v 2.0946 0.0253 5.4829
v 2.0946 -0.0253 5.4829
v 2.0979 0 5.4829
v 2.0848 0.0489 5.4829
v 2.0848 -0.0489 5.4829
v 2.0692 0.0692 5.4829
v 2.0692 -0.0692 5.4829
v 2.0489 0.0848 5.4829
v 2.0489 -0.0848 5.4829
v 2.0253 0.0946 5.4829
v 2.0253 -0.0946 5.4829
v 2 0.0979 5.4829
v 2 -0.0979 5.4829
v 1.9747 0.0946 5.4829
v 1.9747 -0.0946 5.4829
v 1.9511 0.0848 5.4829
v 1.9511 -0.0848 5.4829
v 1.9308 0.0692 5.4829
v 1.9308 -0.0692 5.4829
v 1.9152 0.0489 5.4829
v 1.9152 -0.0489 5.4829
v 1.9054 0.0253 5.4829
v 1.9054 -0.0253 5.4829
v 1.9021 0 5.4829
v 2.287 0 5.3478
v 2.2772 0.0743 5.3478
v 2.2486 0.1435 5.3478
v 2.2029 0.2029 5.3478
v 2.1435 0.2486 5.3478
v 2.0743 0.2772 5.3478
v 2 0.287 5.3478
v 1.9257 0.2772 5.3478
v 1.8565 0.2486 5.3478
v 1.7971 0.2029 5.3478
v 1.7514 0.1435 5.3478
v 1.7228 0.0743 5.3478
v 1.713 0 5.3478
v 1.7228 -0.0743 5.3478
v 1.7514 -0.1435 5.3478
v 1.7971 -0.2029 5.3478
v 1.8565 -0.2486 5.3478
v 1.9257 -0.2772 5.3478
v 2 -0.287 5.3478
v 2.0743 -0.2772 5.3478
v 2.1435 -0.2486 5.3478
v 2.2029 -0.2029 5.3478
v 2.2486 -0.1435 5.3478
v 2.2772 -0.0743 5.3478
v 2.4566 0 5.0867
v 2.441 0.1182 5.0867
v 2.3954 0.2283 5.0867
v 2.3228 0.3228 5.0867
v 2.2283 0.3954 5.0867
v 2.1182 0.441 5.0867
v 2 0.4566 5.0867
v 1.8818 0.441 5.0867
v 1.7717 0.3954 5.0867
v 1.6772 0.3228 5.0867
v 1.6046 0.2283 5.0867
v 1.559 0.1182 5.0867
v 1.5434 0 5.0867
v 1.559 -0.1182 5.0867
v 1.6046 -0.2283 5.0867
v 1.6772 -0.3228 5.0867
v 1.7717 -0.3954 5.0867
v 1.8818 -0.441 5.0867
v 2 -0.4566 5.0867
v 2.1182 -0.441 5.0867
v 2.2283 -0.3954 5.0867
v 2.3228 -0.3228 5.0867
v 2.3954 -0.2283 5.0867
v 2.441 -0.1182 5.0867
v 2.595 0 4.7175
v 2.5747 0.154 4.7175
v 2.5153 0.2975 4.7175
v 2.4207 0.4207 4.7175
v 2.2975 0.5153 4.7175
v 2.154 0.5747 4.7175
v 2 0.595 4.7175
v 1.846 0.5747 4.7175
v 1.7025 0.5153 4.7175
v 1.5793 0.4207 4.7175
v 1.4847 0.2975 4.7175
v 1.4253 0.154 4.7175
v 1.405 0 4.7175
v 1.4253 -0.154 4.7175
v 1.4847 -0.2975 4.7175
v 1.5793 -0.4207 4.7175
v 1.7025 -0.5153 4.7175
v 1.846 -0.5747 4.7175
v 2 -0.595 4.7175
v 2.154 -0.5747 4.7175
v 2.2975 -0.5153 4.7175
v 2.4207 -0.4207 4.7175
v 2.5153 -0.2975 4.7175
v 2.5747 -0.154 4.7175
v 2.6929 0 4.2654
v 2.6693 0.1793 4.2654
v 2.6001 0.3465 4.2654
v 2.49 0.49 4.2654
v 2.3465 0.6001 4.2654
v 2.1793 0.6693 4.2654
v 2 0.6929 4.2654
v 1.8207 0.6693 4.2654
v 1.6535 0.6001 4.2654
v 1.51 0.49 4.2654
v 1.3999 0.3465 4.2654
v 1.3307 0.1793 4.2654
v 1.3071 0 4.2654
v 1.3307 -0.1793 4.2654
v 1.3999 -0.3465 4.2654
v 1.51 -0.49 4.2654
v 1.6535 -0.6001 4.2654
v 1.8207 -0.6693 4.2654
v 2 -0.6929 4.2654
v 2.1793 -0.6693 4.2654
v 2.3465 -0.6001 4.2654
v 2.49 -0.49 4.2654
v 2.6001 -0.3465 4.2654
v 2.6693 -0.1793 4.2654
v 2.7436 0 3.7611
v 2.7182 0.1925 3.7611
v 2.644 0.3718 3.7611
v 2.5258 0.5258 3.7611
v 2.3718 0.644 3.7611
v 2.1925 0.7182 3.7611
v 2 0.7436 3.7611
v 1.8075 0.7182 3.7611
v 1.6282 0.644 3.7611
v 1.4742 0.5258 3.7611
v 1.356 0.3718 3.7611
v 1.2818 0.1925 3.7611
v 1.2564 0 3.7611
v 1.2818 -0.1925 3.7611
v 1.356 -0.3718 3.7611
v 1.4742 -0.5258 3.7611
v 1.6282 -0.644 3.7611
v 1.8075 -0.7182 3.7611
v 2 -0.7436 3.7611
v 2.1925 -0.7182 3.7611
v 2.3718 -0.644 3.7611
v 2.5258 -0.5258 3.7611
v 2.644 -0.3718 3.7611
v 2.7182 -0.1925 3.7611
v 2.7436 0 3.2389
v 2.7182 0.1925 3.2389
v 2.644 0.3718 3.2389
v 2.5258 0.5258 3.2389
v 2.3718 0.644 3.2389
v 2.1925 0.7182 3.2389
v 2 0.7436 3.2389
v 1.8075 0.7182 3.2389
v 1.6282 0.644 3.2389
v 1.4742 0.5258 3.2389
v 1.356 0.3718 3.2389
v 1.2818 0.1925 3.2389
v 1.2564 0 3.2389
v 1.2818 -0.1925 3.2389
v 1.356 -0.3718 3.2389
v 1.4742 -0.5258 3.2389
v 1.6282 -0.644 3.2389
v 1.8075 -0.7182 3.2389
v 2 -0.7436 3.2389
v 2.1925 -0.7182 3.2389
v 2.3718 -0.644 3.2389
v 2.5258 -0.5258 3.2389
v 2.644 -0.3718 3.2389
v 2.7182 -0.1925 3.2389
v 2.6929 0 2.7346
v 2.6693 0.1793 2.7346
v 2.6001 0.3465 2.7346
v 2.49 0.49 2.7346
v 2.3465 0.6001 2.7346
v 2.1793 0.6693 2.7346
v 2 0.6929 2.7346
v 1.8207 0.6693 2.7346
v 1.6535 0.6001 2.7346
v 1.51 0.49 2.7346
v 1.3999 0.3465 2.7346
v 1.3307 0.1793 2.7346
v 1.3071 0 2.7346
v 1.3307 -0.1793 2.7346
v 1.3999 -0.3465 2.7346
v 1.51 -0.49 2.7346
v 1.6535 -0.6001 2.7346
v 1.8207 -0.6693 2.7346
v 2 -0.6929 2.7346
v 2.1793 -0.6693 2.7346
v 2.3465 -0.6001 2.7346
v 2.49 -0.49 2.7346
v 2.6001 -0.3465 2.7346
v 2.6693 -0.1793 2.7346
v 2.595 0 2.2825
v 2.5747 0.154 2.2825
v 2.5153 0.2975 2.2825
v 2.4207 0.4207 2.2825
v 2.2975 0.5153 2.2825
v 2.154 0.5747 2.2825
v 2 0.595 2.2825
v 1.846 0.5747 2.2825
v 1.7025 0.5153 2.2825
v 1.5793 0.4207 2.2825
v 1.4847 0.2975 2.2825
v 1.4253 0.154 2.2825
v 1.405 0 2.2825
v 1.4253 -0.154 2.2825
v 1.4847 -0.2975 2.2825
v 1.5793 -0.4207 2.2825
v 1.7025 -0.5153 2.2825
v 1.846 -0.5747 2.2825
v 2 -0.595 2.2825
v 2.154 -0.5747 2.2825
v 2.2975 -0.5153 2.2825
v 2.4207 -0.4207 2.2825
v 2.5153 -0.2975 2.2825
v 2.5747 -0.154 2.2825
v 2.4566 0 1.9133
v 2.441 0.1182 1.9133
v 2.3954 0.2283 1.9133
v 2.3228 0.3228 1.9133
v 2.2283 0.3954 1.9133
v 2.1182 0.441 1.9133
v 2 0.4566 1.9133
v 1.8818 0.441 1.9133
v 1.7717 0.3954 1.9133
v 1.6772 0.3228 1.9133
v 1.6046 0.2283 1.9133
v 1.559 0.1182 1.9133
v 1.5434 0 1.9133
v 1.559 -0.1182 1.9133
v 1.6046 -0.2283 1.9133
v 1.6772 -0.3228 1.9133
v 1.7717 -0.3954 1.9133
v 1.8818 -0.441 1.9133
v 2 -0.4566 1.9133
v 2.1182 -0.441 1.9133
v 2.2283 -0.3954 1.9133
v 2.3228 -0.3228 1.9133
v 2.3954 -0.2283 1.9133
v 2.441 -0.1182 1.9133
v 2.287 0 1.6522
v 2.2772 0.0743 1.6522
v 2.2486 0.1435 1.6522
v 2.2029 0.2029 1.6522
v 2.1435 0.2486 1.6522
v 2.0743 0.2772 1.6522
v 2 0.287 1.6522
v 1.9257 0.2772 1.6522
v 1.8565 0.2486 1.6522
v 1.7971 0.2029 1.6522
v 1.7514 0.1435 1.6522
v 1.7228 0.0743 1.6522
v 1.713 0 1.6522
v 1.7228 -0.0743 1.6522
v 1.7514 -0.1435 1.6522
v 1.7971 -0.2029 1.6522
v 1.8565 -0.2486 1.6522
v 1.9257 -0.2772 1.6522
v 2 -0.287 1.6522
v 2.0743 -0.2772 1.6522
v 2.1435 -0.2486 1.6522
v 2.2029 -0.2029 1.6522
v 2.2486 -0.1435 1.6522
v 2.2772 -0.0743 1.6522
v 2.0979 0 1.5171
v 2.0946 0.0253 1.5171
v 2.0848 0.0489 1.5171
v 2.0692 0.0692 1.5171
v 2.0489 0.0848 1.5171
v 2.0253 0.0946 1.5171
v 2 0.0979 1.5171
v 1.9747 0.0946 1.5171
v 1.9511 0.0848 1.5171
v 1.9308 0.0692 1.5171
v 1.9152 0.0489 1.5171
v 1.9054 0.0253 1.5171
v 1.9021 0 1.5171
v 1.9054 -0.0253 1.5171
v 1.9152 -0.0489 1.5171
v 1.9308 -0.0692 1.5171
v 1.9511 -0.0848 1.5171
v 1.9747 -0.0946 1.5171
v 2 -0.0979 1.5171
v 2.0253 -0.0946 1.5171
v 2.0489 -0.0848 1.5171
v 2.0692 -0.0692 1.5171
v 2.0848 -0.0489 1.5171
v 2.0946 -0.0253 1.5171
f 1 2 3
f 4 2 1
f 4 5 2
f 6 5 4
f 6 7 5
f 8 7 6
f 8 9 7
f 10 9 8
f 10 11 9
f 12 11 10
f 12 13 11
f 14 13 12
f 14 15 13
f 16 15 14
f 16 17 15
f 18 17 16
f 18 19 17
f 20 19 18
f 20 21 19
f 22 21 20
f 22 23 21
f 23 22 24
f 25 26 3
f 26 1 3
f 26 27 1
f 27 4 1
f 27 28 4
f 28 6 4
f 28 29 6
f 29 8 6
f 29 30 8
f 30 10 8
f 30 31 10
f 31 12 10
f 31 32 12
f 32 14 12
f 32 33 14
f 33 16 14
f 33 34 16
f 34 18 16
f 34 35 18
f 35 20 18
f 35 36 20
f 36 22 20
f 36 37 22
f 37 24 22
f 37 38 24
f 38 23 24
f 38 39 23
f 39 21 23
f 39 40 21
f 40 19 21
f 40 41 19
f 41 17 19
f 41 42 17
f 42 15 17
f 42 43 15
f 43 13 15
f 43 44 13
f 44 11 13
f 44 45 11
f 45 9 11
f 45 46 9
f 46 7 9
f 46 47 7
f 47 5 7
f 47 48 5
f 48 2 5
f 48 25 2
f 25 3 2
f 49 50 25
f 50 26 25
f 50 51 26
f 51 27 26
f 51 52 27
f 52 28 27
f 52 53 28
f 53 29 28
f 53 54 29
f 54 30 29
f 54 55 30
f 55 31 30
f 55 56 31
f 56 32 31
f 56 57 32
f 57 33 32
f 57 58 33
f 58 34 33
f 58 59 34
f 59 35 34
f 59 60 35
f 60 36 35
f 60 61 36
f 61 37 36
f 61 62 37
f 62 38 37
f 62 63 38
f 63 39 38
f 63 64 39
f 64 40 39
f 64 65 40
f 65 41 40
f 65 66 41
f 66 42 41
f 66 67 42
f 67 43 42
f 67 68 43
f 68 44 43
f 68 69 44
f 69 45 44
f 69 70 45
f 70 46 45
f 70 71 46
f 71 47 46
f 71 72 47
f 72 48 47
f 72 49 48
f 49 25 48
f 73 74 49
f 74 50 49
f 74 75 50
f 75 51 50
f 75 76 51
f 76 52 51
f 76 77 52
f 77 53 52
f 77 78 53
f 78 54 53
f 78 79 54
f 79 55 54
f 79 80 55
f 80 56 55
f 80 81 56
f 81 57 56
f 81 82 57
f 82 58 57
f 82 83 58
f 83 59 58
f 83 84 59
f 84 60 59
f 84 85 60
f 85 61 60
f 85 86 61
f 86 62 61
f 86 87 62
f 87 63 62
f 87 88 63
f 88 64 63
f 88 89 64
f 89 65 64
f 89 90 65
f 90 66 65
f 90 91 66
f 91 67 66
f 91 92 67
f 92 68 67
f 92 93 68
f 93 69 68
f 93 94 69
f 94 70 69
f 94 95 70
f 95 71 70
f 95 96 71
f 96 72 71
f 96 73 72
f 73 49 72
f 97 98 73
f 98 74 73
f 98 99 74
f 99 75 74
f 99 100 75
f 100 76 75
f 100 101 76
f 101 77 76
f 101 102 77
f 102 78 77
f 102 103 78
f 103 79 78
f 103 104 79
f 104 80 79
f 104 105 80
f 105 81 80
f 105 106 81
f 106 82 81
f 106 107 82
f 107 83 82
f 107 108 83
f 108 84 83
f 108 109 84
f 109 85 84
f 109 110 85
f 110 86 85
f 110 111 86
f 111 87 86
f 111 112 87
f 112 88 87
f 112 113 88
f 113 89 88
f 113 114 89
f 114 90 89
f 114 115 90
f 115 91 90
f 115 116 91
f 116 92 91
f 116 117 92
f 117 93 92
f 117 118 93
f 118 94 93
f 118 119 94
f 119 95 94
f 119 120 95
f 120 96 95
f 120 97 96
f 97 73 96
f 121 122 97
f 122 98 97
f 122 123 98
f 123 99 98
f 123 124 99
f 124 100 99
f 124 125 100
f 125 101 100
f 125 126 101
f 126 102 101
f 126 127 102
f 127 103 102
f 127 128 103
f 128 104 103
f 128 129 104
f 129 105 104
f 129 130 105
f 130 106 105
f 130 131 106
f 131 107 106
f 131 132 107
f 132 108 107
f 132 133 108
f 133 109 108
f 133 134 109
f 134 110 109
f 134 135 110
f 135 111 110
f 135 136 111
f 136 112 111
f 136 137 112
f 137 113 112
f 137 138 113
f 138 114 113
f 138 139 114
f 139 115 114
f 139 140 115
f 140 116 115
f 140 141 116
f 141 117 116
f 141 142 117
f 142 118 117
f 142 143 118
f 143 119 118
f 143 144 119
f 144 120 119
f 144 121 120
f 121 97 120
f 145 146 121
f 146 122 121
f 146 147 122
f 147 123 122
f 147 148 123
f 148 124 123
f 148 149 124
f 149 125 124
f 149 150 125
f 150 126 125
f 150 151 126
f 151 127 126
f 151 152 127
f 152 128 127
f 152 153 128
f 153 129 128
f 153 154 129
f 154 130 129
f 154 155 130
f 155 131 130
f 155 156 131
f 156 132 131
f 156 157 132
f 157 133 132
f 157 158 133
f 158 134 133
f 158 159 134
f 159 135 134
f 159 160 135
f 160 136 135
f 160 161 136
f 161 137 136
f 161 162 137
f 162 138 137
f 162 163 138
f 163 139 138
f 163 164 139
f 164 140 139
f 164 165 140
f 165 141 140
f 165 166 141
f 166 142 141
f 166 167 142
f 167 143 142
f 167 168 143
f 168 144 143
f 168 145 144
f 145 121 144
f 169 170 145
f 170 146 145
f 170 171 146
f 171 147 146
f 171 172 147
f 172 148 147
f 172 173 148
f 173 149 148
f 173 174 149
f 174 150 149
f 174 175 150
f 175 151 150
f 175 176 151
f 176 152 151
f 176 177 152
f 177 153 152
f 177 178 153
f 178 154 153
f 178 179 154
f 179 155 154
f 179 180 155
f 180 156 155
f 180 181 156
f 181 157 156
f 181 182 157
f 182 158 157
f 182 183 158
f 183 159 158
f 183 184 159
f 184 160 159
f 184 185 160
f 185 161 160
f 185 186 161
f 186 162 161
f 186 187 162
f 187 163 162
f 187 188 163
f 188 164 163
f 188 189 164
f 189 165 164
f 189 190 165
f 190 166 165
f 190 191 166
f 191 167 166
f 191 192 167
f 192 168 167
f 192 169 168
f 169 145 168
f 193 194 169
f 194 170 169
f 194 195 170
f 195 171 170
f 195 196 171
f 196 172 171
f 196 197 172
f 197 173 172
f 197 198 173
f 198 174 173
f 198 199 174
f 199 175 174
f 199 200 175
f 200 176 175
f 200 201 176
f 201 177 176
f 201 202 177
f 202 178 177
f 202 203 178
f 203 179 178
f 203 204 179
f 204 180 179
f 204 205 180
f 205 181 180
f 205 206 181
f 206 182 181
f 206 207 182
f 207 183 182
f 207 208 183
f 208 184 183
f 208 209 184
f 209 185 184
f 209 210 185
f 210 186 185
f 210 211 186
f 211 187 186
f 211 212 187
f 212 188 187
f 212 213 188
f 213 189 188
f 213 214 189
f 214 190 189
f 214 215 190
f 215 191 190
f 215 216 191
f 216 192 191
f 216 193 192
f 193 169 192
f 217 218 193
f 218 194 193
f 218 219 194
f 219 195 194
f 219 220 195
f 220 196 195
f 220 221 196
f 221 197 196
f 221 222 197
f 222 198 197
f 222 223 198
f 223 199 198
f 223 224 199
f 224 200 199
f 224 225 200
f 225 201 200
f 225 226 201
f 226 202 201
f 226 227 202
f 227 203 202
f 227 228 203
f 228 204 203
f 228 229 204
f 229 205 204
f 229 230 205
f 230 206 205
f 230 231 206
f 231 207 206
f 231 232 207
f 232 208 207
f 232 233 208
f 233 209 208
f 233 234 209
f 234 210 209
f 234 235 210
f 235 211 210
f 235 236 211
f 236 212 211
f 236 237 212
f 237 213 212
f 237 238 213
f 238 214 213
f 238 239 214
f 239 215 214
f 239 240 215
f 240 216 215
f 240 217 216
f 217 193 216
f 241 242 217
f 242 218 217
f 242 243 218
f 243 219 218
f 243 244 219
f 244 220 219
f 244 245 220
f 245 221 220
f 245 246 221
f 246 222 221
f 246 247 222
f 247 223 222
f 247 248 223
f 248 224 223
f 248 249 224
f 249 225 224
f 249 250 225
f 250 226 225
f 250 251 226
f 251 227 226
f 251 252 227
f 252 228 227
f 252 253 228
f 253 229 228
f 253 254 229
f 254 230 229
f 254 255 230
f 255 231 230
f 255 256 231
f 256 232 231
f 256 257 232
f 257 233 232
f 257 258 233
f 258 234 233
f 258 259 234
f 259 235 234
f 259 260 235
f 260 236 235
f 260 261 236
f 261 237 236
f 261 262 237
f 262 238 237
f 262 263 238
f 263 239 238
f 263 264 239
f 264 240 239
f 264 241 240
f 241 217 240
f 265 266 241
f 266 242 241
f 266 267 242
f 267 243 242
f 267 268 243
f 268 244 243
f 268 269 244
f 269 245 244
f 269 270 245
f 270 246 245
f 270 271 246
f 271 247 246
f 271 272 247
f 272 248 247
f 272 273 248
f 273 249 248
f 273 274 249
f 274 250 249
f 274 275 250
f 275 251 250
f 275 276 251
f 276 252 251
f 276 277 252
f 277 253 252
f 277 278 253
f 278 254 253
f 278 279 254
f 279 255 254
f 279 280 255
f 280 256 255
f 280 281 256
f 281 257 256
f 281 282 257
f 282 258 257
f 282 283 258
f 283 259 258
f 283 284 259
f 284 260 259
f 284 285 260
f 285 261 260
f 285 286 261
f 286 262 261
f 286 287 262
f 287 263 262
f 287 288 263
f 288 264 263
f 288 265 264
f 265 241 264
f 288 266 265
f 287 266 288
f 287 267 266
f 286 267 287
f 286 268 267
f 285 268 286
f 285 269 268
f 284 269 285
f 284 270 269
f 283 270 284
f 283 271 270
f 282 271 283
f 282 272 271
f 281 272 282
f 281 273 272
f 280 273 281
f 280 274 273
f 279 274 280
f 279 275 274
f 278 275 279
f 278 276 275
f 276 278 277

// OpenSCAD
sc=t();
//translate([-2,0, 3-(smooth(t(-.55+$t)))*3])
//poissonscale (.5+icosw((sc))*.5 ) translate([0,0,0])scale(.0251)import("Masha.stl");
translate([2,0, 3-(smooth(t(-.5+$t)))*3])
poissonscale (.5+ icosw( smooth(sc))) translate([0,0,1]) sphere(1 ,$fn=24);

module poissonscale(x)
{
    p=1-(x-1)*.25;
    scale([p,p,x])
    children();
    
    }
    
    
    function t(t=$t)=0.5+sin(t*360)*.5;
;

function lerp(start, end, bias) = (end * bias + start * (1 - bias));
function mods(v,steps=3) = ( (v*steps)%1);

function mstep(v,steps=3) = (floor(v*steps)/steps );

function smooth(a) =
let (b = clamp(a))(b * b * (3 - 2 * b));

function smooths(v, steps=3) = smooth(smooth(mods(v, steps))) / steps +
mstep(v, steps);

function clamp(a, b = 0, c = 1) = min(max(a, b), c);

function gauss(x) = x + (x - smooth(x));

function sinw(i)=gauss(i)-sin(i*360)/2;
function isinw(i)=sin(i*360)/2+smooth(i);

function cosw(i)=cos(i*360)/2 -0.5+i;
function icosw(i)=-cos(i*360)/2+0.5+i;

 PI = 3.14159265358979;

// Robert Penner's easing functions in GLSL.
// Available as a module for glslify. http://stack.gl/glsl-easings/

function  easeInOutCubic(  t)=  

      t<0.5 ? 4.*t*t*t : (t - 1.)*(2.*t - 2.)*(2.*t - 2.) + 1.;
 ;

function  easeInOutQuint(  t)=  

      t<.5 ? 16.*t*t*t*t*t : 1. +16.*(--t)*t*t*t*t;
 ;

function  easeOutQuad(  t)=   
      -1. * t * (t - 2.);
 ;

function  easeInQuad(  t)=   
      t * t;
 ;

 
function  bounceOut(  t)=   
    let(
 a = 4.0 / 11.0,
 b = 8.0 / 11.0,
 c = 9.0 / 10.0,

 ca = 4356.0 / 361.0,
 cb = 35442.0 / 1805.0,
 cc = 16061.0 / 1805.0,

 t2 = t * t
 )

    t < a
    ? 7.5625 * t2
    : t < b
      ? 9.075 * t2 - 9.9 * t + 3.4
      : t < c
        ? ca * t2 - cb * t + cc
        : 10.8 * t * t - 20.52 * t + 10.72;
 ;

function bounceInOut(  t)=   
    t < 0.5
    ? 0.5 * (1.0 - bounceOut(1.0 - t * 2.0))
    : 0.5 * bounceOut(t * 2.0 - 1.0) + 0.5;
 ;

function bounceIn(  t)=   
    1.0 - bounceOut(1.0 - t);
 ;


function elasticOut(  t)=   
    sin(-13.0 * (t + 1.0) * PI/2.) * pow(2.0, -10.0 * t) + 1.0;
 ;

function circularInOut(  t)=   
    t < 0.5
    ? 0.5 * (1.0 - sqrt(1.0 - 4.0 * t * t))
    : 0.5 * (sqrt((3.0 - 2.0 * t) * (2.0 * t - 1.0)) + 1.0);
 ;

function exponentialOut(  t)=   
    t == 1.0 ? t : 1.0 - pow(2.0, -10.0 * t);
 ;

function exponentialIn(  t)=   
    t == 0.0 ? t : pow(2.0, 10.0 * (t - 1.0));
 ;

function exponentialInOut(  t)=   
    t == 0.0 || t == 1.0
    ? t
    : t < 0.5
      ? +0.5 * pow(2.0, (20.0 * t) - 10.0)
      : -0.5 * pow(2.0, 10.0 - (t * 20.0)) + 1.0;
 ;
